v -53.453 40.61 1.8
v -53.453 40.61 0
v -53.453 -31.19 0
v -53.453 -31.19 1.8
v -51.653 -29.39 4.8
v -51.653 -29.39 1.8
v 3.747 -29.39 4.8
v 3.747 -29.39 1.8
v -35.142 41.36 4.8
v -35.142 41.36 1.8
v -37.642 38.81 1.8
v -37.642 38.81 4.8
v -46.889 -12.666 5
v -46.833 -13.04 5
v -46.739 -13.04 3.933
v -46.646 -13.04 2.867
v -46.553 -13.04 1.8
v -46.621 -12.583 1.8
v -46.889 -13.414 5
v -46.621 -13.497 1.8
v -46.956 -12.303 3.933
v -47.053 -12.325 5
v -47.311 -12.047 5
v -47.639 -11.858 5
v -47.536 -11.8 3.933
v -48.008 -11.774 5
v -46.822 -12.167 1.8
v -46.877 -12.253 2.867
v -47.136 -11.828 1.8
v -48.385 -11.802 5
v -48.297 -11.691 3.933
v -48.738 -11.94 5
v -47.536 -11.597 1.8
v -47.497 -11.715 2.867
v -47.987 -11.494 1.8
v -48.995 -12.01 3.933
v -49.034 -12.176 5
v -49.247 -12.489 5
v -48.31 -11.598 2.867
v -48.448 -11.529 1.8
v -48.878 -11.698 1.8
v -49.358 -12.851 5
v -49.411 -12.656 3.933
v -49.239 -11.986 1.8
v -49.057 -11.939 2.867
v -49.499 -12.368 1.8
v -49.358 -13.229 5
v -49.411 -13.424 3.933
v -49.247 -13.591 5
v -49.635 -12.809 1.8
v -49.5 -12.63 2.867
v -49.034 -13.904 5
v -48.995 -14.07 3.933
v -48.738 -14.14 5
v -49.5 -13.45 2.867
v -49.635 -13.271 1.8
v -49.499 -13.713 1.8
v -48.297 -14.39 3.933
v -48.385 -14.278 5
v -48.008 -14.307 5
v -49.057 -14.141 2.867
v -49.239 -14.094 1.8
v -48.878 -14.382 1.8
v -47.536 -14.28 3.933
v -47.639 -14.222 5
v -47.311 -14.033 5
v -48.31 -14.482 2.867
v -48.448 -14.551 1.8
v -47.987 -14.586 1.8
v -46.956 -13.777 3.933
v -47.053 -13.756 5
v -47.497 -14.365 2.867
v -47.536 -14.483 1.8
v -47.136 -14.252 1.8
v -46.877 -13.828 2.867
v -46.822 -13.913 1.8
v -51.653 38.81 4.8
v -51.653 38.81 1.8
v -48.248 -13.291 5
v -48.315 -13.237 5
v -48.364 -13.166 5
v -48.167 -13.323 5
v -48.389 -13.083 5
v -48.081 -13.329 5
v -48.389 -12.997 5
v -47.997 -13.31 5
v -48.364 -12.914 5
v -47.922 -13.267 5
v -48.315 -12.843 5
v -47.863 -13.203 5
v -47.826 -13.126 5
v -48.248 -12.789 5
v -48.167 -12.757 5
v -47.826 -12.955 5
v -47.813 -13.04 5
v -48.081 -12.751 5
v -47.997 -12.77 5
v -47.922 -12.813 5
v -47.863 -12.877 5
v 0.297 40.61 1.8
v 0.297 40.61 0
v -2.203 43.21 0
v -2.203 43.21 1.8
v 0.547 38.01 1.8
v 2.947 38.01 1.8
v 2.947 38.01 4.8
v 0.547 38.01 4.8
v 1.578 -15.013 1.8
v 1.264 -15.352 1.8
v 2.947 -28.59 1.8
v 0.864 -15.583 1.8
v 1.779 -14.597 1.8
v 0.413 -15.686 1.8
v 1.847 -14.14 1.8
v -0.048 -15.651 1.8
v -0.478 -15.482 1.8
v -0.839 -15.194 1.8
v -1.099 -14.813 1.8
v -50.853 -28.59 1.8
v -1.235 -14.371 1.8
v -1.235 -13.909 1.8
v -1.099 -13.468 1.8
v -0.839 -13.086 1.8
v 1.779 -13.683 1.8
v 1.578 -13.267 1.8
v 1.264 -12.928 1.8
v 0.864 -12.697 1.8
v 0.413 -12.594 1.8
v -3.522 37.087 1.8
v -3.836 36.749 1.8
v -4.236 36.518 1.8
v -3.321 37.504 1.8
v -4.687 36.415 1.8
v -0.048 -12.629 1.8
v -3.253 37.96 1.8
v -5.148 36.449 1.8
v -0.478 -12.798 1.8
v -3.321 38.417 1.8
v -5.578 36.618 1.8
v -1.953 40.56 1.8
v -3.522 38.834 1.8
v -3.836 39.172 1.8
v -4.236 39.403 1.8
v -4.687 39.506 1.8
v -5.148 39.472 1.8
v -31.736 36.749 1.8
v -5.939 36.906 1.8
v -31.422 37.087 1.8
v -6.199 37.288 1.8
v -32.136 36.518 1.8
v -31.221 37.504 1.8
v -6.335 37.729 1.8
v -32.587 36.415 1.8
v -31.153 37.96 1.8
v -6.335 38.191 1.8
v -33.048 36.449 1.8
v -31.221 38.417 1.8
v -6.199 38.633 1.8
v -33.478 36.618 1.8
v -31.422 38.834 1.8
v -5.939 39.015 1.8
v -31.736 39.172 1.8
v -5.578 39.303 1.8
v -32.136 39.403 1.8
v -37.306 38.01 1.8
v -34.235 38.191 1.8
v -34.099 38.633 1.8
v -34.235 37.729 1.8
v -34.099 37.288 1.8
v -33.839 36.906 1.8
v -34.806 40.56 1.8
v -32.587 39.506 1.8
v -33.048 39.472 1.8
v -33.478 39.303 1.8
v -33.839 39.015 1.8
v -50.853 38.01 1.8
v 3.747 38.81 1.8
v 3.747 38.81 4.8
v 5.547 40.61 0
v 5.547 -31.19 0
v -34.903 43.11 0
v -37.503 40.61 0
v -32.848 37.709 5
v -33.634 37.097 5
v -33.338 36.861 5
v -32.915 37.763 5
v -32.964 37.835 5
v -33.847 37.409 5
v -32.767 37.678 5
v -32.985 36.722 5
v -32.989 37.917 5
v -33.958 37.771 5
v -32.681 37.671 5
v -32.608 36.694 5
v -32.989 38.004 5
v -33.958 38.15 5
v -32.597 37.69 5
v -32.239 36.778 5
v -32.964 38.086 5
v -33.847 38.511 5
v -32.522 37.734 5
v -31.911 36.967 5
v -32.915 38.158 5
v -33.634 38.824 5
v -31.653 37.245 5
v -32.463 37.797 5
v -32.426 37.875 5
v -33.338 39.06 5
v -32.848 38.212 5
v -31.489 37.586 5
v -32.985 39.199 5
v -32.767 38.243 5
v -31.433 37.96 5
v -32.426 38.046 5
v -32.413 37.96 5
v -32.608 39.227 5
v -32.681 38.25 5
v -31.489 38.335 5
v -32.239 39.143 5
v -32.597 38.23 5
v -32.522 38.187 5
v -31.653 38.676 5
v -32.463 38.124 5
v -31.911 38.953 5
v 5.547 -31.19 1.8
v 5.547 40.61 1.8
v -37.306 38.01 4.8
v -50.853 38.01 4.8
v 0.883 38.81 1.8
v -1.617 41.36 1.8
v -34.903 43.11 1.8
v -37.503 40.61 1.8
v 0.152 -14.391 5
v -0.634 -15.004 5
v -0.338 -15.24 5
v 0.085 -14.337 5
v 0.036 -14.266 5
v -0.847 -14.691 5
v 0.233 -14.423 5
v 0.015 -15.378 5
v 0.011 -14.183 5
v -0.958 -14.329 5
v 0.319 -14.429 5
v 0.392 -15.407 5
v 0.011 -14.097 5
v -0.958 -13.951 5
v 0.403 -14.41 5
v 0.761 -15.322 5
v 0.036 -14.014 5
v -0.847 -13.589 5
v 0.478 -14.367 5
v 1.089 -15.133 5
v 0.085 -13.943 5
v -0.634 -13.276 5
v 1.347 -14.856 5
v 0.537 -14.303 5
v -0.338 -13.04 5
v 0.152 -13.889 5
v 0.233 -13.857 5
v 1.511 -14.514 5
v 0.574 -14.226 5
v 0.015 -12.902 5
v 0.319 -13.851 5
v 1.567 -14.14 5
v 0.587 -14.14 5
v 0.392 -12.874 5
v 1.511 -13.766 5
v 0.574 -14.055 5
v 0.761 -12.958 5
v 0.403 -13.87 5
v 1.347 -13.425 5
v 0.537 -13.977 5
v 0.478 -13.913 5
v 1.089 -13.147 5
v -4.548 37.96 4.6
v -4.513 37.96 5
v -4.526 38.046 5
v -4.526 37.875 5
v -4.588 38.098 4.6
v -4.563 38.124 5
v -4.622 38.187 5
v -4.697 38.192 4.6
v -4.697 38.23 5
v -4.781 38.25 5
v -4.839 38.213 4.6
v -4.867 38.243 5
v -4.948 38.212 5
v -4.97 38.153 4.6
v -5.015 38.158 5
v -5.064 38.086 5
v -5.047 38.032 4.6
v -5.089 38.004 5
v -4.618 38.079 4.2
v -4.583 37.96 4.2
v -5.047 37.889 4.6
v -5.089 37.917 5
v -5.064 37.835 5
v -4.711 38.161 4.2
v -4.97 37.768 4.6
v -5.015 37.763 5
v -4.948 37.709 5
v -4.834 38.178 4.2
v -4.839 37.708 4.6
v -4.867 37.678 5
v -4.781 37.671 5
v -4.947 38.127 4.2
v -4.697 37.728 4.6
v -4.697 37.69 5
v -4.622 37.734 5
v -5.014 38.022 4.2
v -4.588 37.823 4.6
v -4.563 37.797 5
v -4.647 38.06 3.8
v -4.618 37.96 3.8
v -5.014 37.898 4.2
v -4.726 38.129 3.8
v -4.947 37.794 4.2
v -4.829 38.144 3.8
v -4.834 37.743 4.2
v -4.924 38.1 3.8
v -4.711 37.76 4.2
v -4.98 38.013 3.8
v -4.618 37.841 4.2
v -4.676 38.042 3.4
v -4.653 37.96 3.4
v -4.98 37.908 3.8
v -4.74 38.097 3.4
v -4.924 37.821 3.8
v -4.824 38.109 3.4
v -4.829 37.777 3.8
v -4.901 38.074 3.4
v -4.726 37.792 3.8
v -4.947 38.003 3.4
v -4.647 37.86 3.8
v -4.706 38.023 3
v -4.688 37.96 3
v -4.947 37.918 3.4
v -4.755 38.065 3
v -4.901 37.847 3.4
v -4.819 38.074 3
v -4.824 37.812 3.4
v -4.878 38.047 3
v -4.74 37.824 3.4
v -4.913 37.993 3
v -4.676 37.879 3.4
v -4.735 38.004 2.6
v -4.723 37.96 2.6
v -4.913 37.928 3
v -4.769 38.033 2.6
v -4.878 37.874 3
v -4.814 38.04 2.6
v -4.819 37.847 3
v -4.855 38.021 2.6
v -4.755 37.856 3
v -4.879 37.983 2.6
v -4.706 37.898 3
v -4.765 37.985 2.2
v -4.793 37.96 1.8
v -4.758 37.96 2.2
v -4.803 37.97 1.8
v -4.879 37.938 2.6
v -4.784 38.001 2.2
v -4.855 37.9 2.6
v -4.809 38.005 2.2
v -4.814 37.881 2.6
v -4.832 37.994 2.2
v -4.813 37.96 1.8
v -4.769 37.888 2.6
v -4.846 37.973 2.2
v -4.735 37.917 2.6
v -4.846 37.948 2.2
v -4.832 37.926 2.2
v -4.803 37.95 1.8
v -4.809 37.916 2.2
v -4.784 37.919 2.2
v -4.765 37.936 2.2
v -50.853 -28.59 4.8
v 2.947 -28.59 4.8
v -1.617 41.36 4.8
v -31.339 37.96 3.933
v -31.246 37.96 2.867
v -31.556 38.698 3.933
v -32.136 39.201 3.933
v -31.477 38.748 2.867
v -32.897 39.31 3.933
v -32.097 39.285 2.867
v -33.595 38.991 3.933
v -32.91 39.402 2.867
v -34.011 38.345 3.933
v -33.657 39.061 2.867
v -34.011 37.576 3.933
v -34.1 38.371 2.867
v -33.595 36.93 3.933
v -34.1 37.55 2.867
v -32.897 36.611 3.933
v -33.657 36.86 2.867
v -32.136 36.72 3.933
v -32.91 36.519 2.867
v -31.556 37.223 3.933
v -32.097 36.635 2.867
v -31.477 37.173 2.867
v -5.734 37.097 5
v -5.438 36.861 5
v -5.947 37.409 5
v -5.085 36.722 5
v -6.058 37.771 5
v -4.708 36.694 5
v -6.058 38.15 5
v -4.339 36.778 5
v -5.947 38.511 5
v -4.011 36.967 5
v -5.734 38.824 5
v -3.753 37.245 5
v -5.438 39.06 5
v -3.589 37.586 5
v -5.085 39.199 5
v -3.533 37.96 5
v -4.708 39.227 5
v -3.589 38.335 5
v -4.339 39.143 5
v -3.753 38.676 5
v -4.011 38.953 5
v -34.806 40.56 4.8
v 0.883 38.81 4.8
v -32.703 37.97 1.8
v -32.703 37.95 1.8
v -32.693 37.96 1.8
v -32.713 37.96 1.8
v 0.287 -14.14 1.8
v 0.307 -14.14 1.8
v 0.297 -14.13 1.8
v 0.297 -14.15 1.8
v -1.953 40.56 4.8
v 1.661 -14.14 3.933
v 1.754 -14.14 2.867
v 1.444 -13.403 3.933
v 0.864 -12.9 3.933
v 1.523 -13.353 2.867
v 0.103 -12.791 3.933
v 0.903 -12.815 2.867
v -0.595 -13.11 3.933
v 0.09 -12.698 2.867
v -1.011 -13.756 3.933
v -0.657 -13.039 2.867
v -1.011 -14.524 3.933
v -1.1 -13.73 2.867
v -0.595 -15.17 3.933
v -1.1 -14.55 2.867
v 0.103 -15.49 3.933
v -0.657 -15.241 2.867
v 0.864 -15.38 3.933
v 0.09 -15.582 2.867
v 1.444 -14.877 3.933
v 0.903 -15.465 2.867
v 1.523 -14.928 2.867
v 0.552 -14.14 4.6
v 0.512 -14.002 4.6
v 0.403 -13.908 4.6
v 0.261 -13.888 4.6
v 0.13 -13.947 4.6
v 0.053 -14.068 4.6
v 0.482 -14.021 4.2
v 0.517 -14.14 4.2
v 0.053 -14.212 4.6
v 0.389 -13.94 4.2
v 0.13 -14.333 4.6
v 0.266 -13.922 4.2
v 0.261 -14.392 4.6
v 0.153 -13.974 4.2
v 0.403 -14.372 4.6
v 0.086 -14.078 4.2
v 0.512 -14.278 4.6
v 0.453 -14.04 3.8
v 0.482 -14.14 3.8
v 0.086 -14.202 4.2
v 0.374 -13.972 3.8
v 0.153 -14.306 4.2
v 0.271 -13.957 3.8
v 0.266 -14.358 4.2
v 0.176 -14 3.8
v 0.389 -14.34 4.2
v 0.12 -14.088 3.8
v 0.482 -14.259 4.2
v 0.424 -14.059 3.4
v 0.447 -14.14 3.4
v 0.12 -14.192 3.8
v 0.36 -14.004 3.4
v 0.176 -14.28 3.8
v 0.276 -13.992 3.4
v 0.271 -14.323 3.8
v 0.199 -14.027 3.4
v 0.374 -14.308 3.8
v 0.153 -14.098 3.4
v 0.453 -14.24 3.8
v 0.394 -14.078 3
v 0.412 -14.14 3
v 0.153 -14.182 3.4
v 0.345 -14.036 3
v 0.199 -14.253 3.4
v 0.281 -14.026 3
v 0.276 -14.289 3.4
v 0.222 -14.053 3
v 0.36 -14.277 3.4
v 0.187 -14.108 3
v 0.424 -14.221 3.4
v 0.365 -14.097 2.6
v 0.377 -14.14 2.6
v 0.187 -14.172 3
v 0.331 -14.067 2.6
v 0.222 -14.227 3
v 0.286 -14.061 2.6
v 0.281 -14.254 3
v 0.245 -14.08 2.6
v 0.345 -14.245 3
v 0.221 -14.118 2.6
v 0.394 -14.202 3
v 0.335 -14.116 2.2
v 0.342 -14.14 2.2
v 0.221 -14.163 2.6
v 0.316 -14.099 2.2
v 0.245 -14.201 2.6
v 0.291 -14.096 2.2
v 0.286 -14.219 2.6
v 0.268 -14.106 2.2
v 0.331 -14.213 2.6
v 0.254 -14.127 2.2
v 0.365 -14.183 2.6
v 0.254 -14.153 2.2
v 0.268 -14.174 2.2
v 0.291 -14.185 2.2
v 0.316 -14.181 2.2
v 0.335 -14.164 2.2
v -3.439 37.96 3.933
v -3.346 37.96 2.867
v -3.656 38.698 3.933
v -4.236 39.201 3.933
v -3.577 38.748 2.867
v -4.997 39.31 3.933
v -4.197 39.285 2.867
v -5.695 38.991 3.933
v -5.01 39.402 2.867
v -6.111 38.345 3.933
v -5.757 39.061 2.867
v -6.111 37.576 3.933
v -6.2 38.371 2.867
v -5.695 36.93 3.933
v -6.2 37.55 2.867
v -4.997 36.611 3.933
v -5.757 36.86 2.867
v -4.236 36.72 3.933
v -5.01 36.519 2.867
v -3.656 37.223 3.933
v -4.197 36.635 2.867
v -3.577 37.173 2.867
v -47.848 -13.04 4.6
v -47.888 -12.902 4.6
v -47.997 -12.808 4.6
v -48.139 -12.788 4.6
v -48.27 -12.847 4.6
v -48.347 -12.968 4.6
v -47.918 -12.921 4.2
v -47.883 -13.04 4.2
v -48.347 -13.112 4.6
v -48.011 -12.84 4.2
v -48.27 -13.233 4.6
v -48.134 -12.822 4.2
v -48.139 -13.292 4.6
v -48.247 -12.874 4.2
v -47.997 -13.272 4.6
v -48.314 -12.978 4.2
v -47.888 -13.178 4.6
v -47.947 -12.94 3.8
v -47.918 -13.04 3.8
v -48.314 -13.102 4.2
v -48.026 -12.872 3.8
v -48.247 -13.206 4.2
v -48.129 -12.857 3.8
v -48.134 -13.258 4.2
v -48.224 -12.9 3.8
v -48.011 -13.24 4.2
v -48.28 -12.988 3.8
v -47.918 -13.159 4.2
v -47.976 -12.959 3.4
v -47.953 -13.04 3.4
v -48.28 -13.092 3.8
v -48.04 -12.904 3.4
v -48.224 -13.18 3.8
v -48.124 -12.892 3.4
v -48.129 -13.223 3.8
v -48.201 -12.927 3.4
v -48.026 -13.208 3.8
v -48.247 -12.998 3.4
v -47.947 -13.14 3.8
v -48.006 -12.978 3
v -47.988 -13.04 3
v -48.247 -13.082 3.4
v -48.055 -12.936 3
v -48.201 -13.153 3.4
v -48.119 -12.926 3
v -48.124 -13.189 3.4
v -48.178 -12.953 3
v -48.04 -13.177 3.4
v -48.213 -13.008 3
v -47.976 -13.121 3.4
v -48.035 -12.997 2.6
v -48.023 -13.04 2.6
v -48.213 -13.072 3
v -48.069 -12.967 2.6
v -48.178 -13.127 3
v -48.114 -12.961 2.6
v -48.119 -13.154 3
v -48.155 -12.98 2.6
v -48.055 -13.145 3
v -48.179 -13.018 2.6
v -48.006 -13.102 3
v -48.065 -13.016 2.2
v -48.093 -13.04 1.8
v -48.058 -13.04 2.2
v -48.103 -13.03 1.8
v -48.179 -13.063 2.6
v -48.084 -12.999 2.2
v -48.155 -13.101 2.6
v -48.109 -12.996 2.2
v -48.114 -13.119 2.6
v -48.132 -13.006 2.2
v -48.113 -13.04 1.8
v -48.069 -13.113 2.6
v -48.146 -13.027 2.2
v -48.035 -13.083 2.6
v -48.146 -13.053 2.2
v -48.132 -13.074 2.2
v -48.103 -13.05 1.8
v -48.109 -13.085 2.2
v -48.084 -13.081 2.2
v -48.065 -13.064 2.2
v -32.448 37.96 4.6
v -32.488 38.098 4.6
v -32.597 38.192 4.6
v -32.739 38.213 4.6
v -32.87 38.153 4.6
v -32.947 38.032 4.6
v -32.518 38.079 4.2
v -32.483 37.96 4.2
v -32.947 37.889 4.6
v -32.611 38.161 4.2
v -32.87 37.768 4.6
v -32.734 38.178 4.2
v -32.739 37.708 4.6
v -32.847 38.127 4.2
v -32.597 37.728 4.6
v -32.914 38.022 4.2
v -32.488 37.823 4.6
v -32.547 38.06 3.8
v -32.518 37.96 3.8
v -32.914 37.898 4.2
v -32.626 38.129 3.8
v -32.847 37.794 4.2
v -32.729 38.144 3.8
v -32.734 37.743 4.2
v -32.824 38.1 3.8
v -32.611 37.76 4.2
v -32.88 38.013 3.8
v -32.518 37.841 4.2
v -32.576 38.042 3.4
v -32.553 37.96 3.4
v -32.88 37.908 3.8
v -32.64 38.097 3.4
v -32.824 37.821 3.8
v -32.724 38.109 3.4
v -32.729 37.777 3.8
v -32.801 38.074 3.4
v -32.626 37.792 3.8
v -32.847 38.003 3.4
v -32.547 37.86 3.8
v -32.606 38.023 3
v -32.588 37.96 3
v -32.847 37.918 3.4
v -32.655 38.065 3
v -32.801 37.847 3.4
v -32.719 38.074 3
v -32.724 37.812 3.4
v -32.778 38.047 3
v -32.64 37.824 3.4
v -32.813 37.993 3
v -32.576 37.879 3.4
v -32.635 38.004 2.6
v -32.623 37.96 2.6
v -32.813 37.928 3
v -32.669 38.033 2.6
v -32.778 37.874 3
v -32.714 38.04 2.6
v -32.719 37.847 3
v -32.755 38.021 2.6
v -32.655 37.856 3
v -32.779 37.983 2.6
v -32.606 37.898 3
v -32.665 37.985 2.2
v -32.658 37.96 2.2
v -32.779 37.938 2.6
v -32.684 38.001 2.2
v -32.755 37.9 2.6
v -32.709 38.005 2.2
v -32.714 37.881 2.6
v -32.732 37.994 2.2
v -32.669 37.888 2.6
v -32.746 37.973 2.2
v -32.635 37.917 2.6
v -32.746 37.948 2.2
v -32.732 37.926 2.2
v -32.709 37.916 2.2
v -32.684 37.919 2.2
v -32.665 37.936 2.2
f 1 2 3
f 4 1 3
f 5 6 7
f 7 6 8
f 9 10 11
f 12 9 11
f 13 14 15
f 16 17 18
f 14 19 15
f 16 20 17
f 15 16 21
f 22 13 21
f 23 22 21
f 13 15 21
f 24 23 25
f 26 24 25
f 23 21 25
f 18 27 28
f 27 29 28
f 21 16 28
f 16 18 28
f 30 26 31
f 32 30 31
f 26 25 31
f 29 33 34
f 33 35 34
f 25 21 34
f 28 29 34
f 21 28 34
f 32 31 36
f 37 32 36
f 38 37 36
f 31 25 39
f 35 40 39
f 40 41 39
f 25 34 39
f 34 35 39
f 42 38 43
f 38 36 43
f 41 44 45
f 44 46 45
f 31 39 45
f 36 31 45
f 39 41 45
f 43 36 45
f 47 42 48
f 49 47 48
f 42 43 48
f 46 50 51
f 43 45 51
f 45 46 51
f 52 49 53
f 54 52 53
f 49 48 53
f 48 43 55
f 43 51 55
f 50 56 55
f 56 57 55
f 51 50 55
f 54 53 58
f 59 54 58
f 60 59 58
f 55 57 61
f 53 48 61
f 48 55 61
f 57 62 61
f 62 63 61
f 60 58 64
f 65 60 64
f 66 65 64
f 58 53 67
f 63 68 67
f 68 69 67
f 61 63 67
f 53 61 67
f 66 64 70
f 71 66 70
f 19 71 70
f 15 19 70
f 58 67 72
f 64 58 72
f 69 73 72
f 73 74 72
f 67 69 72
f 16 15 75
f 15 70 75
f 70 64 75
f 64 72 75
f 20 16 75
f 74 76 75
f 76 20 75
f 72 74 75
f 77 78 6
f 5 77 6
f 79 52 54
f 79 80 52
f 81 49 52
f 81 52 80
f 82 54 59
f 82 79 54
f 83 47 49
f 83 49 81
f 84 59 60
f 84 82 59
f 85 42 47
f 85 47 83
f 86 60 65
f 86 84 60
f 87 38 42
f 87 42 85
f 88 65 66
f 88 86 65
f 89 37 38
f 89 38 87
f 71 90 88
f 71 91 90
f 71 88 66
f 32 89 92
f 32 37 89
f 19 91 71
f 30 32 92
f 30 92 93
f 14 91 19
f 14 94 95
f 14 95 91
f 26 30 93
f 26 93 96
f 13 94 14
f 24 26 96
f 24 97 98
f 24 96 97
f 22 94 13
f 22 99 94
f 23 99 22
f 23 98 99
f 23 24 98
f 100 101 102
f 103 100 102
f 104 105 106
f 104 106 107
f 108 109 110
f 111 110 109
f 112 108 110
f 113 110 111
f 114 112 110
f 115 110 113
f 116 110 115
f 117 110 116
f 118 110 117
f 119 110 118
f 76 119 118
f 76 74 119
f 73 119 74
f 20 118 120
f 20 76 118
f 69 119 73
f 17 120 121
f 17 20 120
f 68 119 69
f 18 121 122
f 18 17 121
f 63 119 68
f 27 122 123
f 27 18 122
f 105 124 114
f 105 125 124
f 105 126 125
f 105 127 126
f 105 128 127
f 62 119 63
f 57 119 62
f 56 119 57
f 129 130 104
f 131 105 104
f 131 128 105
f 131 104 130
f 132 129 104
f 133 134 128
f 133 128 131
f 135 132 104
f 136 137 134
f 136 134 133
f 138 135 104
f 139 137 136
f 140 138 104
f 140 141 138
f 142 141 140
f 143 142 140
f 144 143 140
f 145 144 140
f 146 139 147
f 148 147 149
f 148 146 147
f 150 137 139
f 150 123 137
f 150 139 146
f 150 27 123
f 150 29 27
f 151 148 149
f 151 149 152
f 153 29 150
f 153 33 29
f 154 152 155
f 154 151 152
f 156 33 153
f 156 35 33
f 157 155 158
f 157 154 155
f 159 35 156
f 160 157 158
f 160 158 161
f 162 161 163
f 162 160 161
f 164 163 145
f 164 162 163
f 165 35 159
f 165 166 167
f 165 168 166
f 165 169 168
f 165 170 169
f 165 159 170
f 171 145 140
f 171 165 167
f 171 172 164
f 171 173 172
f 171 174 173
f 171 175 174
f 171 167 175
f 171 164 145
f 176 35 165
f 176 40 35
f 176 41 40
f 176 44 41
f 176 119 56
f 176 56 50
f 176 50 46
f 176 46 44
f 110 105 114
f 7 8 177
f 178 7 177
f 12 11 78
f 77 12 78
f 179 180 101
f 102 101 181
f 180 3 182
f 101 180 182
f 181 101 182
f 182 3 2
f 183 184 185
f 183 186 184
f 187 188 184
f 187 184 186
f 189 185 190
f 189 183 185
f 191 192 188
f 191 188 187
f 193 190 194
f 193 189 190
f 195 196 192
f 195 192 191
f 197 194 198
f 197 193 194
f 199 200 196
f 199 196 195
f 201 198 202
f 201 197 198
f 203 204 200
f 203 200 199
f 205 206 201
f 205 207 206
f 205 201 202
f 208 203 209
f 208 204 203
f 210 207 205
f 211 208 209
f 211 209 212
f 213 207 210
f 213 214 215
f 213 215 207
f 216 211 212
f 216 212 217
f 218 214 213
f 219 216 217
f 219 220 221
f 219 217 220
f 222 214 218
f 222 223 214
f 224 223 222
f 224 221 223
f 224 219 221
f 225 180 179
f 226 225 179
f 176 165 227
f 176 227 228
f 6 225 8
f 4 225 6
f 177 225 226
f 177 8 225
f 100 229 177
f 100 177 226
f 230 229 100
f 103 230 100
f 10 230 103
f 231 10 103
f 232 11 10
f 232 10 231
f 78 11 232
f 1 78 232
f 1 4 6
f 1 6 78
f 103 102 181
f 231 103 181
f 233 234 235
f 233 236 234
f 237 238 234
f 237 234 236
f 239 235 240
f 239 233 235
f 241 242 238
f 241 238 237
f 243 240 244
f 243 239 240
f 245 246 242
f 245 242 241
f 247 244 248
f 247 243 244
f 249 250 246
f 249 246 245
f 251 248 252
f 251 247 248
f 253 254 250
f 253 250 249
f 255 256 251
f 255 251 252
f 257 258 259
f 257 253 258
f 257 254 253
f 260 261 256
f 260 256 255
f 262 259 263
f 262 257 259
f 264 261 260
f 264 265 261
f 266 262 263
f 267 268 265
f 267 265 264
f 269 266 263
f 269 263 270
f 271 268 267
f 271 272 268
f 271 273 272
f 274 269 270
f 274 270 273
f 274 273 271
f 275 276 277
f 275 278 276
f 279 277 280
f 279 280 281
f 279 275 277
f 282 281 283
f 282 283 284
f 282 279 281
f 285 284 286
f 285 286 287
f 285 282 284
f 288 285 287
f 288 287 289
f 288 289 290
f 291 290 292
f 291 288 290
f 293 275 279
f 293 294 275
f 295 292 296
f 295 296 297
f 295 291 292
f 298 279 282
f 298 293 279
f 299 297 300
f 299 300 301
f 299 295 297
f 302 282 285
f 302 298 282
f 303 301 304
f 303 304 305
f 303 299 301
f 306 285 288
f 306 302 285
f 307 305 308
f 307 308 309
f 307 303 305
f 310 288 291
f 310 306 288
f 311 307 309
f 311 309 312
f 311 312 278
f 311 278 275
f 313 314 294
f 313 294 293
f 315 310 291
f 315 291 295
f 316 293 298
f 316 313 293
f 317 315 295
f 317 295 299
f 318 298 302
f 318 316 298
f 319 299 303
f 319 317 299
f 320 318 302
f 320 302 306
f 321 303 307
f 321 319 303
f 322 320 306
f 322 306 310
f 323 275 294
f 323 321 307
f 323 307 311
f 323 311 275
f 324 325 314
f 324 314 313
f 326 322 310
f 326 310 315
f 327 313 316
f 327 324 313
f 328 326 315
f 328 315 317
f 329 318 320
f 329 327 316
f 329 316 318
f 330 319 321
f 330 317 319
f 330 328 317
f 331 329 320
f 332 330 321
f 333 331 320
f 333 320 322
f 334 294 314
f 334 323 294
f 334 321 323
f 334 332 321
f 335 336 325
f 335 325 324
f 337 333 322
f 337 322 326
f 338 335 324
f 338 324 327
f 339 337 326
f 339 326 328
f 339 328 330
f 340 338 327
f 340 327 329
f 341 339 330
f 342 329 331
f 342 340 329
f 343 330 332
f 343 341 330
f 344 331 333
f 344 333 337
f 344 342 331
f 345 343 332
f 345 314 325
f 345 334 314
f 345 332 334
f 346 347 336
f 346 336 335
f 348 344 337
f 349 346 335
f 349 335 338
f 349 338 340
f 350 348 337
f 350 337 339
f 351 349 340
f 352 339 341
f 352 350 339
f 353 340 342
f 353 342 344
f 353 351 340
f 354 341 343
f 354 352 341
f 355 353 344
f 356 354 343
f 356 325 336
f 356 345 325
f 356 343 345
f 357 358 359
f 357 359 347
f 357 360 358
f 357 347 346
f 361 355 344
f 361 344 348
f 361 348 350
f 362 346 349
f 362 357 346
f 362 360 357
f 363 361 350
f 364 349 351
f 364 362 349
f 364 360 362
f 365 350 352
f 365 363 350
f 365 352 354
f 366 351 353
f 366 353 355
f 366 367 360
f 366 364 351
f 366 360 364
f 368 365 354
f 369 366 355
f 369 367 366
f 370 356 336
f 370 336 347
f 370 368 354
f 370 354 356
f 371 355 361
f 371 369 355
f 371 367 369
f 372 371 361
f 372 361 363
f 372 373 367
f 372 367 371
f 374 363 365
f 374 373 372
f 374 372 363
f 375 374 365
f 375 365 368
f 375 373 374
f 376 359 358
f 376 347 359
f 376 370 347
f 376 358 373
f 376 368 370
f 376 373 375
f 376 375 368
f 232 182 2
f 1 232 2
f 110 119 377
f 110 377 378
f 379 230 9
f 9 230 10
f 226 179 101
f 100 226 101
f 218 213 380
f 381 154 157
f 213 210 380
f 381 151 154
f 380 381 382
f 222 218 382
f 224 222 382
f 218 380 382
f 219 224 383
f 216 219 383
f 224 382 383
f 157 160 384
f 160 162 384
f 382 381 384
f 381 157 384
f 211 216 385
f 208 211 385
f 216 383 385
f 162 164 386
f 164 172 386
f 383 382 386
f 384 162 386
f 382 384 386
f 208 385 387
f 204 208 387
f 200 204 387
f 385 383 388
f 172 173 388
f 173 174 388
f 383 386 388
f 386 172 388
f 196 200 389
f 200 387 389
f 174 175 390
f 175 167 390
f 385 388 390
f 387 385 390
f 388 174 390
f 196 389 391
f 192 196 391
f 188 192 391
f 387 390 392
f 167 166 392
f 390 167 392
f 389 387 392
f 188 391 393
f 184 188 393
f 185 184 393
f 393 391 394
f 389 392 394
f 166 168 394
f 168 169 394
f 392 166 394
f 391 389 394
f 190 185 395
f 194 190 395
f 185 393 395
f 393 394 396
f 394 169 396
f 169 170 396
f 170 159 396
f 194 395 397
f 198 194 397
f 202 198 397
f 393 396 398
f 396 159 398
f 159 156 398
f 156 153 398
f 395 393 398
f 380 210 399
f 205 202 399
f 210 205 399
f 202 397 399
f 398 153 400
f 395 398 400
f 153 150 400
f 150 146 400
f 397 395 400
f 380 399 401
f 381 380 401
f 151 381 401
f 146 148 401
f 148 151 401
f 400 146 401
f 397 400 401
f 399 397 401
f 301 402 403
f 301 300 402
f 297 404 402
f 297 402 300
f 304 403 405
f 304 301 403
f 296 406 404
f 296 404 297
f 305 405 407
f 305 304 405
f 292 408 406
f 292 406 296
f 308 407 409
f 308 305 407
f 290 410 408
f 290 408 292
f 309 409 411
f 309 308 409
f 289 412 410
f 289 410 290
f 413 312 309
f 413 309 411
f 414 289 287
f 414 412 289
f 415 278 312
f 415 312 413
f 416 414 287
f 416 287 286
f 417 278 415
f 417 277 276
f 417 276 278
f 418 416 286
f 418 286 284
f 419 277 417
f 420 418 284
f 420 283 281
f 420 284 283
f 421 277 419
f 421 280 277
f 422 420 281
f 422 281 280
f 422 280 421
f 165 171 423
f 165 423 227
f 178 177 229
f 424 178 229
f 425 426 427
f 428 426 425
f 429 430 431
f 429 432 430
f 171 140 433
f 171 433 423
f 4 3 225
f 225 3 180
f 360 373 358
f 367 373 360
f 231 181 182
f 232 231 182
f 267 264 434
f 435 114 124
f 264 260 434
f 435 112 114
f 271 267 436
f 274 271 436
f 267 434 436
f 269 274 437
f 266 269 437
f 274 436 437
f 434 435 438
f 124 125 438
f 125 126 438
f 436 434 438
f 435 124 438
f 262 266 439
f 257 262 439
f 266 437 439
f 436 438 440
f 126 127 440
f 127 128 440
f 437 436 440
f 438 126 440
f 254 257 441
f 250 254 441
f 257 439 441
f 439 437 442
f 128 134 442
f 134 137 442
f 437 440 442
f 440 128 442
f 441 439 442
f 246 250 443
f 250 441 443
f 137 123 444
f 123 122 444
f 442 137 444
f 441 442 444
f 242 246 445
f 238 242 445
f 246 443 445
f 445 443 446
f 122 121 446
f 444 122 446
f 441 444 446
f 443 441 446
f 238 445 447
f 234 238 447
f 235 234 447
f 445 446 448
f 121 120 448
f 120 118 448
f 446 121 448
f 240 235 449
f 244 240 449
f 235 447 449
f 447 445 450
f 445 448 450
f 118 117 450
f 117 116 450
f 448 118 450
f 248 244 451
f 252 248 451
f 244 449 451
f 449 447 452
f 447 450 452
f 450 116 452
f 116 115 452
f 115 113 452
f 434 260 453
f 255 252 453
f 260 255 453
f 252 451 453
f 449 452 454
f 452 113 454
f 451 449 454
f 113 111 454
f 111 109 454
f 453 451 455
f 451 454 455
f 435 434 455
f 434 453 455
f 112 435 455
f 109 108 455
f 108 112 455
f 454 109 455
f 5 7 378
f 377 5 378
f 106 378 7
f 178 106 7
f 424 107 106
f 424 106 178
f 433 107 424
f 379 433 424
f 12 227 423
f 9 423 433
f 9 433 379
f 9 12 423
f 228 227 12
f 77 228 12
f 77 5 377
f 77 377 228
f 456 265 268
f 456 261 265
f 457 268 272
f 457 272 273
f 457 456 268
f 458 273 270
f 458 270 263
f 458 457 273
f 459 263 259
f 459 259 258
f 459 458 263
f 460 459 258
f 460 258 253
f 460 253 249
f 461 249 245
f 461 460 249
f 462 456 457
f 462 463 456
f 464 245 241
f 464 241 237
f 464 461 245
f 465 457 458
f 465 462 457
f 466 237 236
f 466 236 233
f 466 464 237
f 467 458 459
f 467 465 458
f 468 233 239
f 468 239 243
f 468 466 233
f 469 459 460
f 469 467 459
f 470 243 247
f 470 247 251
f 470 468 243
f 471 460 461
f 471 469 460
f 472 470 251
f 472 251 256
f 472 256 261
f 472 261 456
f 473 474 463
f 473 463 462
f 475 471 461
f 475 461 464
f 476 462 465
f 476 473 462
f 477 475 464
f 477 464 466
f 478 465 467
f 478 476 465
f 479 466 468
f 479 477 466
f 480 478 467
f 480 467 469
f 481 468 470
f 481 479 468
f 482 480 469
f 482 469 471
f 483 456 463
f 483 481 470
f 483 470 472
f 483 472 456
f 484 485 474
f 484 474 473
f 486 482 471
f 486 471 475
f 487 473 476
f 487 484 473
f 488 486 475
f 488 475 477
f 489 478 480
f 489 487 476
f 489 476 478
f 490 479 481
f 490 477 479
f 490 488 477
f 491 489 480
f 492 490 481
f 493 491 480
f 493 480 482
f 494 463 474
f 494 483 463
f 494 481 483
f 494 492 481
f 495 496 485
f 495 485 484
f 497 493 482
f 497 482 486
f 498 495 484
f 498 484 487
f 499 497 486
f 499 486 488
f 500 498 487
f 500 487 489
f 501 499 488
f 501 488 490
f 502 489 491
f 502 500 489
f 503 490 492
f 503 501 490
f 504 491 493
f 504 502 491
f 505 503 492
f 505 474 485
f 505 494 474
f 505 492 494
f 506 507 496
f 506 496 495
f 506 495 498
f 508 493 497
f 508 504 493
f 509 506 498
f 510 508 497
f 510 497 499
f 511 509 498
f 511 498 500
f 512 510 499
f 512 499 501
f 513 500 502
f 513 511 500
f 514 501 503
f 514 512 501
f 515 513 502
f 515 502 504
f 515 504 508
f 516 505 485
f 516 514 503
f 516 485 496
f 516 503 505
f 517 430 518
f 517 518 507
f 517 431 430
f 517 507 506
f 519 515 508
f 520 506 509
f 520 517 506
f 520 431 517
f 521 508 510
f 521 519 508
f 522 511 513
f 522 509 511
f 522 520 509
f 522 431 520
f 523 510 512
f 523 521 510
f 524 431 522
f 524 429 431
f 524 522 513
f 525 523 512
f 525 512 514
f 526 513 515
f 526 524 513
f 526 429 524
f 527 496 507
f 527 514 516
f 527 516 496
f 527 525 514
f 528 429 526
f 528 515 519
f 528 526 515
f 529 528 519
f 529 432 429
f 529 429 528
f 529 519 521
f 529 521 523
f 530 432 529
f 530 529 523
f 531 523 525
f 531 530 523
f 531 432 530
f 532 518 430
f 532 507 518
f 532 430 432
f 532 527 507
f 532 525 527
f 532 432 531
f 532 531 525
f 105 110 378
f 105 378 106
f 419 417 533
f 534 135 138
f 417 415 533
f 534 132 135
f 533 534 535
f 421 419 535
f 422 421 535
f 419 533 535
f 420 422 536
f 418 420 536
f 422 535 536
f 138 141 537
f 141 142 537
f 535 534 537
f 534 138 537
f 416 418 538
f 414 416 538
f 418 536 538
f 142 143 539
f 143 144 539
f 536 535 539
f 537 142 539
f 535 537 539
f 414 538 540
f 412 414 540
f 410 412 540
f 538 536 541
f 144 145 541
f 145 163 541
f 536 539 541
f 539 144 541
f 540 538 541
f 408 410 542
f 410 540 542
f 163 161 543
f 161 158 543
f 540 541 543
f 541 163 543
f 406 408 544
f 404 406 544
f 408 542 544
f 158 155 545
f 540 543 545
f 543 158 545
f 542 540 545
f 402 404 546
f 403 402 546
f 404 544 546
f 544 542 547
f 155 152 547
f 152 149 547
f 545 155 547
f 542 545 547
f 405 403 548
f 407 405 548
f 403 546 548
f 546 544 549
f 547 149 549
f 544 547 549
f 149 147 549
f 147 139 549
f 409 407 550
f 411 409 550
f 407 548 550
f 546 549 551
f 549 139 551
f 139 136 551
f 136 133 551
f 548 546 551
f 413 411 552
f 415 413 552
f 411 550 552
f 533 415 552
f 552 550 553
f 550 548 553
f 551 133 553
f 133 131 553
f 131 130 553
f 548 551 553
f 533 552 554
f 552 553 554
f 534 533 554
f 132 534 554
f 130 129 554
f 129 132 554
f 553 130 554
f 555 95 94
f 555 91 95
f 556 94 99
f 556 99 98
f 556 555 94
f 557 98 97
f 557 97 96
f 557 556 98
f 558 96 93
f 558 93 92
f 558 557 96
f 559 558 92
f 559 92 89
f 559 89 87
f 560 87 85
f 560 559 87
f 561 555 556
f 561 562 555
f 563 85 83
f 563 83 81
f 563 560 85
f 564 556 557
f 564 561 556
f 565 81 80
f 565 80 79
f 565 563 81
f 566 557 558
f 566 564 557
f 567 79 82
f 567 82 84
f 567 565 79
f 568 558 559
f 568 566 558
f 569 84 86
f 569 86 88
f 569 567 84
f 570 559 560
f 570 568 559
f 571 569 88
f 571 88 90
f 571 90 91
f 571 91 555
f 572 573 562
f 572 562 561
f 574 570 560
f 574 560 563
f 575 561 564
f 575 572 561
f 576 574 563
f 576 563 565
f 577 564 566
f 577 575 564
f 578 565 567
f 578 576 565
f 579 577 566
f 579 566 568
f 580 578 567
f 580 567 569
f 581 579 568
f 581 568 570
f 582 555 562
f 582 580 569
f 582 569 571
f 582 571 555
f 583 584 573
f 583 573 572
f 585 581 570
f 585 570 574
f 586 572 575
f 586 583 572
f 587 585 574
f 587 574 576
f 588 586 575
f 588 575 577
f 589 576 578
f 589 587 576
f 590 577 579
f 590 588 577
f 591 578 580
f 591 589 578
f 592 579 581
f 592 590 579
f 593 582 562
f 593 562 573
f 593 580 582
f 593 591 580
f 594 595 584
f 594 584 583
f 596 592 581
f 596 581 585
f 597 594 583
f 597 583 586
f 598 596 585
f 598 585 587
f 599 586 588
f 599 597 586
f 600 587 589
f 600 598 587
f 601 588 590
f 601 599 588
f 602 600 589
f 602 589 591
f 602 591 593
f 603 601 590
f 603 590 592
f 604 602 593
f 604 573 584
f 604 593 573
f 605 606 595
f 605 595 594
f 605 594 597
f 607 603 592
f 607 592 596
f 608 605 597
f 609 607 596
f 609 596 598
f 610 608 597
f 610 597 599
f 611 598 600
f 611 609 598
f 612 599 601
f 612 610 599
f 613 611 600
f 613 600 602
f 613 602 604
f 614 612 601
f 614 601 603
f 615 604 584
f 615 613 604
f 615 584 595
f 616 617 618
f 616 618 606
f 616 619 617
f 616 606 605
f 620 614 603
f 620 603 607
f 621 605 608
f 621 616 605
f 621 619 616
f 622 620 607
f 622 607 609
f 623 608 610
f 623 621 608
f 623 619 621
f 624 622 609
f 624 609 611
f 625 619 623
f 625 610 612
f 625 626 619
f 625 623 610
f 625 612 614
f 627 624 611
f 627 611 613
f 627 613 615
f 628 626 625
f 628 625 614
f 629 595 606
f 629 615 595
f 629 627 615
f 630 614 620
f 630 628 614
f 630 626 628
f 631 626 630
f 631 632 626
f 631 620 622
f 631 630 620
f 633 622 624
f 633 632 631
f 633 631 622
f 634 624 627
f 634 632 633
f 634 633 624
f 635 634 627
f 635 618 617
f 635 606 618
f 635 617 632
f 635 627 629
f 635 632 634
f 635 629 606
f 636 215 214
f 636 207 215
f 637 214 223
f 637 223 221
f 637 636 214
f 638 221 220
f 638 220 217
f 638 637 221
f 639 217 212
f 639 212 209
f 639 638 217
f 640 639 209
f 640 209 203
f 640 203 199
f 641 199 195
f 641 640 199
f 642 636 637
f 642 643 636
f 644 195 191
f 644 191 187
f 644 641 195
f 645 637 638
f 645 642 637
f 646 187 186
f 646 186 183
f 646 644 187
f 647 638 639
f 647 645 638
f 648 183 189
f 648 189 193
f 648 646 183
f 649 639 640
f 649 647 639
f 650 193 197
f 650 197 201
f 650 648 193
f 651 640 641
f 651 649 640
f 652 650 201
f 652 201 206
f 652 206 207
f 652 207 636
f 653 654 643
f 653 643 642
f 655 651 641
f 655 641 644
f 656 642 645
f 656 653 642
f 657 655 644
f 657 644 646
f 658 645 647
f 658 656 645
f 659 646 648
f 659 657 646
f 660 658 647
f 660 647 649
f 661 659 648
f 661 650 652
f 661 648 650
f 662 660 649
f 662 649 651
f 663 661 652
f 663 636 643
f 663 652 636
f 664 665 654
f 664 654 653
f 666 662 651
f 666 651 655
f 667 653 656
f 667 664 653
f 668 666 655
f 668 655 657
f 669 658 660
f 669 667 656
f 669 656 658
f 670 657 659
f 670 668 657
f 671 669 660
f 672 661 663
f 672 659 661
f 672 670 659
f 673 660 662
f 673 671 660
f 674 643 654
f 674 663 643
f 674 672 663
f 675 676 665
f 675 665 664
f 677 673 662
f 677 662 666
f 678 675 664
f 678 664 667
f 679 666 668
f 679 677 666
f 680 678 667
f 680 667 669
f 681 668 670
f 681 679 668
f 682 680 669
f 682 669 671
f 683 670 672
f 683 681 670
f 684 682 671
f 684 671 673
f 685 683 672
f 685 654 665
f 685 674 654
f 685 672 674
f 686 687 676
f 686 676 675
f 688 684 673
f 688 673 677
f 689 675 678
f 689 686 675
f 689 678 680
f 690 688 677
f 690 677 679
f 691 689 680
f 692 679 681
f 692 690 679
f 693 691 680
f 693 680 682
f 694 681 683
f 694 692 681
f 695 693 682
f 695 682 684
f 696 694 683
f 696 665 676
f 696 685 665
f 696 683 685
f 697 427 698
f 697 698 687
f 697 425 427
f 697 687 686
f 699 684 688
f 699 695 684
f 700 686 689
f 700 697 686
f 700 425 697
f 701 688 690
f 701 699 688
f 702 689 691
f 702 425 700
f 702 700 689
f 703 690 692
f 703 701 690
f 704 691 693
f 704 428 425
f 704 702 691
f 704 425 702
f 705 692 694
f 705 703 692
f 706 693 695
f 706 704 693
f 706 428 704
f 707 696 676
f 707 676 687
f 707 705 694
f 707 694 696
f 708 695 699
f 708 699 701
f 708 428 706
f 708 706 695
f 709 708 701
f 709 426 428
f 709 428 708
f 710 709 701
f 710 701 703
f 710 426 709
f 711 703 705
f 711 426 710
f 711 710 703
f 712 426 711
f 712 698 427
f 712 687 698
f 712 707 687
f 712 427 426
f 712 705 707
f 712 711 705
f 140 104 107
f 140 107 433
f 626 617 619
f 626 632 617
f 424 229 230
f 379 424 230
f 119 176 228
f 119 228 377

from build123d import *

# Parameters (mm, degrees)
BOSS_EXTRUDE1_DEPTH           = 1.8
EXTRUDE_THIN1_START           = 1.8
EXTRUDE_THIN1_DEPTH           = 3
SKETCH7_R                     = 1.55
SKETCH7_R_2                   = 0.01
EXTRUDE_THIN2_DEPTH           = 3.2
EXTRUDE_THIN2_DRAFT           = 5
EXTRUDE_THIN2_PROFILE_2_DEPTH = 3.2
EXTRUDE_THIN2_PROFILE_2_DRAFT = 5
EXTRUDE_THIN2_PROFILE_3_DEPTH = 3.2
EXTRUDE_THIN2_PROFILE_3_DRAFT = 5
EXTRUDE_THIN2_PROFILE_4_DEPTH = 3.2
EXTRUDE_THIN2_PROFILE_4_DRAFT = 5


with BuildPart() as part:
    # Sketch1 → Boss-Extrude1 (new body)
    with BuildSketch(Plane(origin=(0, 0, 0), x_dir=(0, 1, 0), z_dir=(0, 0, 1))):
        Polygon((40.609900374, 53.452613812), (-31.190099626, 53.452613812), (-31.190099626, -5.547386188), (40.609900374, -5.547386188), (40.609900374, -0.297386188), (43.209900374, 2.202613812), (43.109900374, 34.902613812), (40.609900374, 37.502613812), align=None)
    extrude(amount=BOSS_EXTRUDE1_DEPTH)

    # Sketch5 → Extrude-Thin1 (add)
    with BuildSketch(Plane(origin=(0, 0, 0), x_dir=(0, 1, 0), z_dir=(0, 0, 1)).offset(EXTRUDE_THIN1_START)):
        Polygon((-29.390099626, 51.652613812), (-29.390099626, -3.747386188), (38.809900374, -3.747386188), (38.809900374, -0.88342499), (41.360418353, 1.616884702), (41.360418353, 35.141633158), (38.809900374, 37.64194285), (38.809900374, 51.652613812), align=None)
        Polygon((-28.590099626, 50.852613812), (-28.590099626, -2.947386188), (38.009900374, -2.947386188), (38.009900374, -0.547386188), (40.560418353, 1.952923505), (40.560418353, 34.805594355), (38.009900374, 37.305904047), (38.009900374, 50.852613812), align=None, mode=Mode.SUBTRACT)
    extrude(amount=EXTRUDE_THIN1_DEPTH)


with BuildPart() as extrude_thin2_tool:
    # Sketch7 → Extrude-Thin2 (with draft: the straight prism first)
    with BuildSketch(Plane.XY.offset(1.8)):
        with Locations((-4.802613812, 37.960418353)):
            Circle(SKETCH7_R)
        with Locations((-4.802613812, 37.960418353)):
            Circle(SKETCH7_R_2, mode=Mode.SUBTRACT)
    extrude(amount=EXTRUDE_THIN2_DEPTH)
    # Extrude-Thin2: the draft: its side faces are tilted about the plane it starts from
    extrude_thin2_sides = [extrude_thin2_tool.faces().sort_by_distance(p)[0] for p in [
        (-6.352613812, 37.960418353, 3.4),
        (-4.812613812, 37.960418353, 3.4),
    ]]
    draft(extrude_thin2_sides, Plane.XY.offset(1.8), EXTRUDE_THIN2_DRAFT)


with BuildPart() as part_1:
    add(part.part)

    # Extrude-Thin2: add extrude_thin2_tool
    add(extrude_thin2_tool.part)


with BuildPart() as extrude_thin2_profile_2_tool:
    # Sketch7 → Extrude-Thin2 profile 2 (with draft: the straight prism first)
    with BuildSketch(Plane.XY.offset(1.8)):
        with Locations((-32.702613812, 37.960418353)):
            Circle(SKETCH7_R)
        with Locations((-32.702613812, 37.960418353)):
            Circle(SKETCH7_R_2, mode=Mode.SUBTRACT)
    extrude(amount=EXTRUDE_THIN2_PROFILE_2_DEPTH)
    # Extrude-Thin2 profile 2: the draft: its side faces are tilted about the plane it starts from
    extrude_thin2_profile_2_sides = [extrude_thin2_profile_2_tool.faces().sort_by_distance(p)[0] for p in [
        (-34.252613812, 37.960418353, 3.4),
        (-32.712613812, 37.960418353, 3.4),
    ]]
    draft(extrude_thin2_profile_2_sides, Plane.XY.offset(1.8), EXTRUDE_THIN2_PROFILE_2_DRAFT)


with BuildPart() as part_2:
    add(part_1.part)

    # Extrude-Thin2 profile 2: add extrude_thin2_profile_2_tool
    add(extrude_thin2_profile_2_tool.part)


with BuildPart() as extrude_thin2_profile_3_tool:
    # Sketch7 → Extrude-Thin2 profile 3 (with draft: the straight prism first)
    with BuildSketch(Plane.XY.offset(1.8)):
        with Locations((0.297386188, -14.140099626)):
            Circle(SKETCH7_R)
        with Locations((0.297386188, -14.140099626)):
            Circle(SKETCH7_R_2, mode=Mode.SUBTRACT)
    extrude(amount=EXTRUDE_THIN2_PROFILE_3_DEPTH)
    # Extrude-Thin2 profile 3: the draft: its side faces are tilted about the plane it starts from
    extrude_thin2_profile_3_sides = [extrude_thin2_profile_3_tool.faces().sort_by_distance(p)[0] for p in [
        (-1.252613812, -14.140099626, 3.4),
        (0.287386188, -14.140099626, 3.4),
    ]]
    draft(extrude_thin2_profile_3_sides, Plane.XY.offset(1.8), EXTRUDE_THIN2_PROFILE_3_DRAFT)


with BuildPart() as part_3:
    add(part_2.part)

    # Extrude-Thin2 profile 3: add extrude_thin2_profile_3_tool
    add(extrude_thin2_profile_3_tool.part)


with BuildPart() as extrude_thin2_profile_4_tool:
    # Sketch7 → Extrude-Thin2 profile 4 (with draft: the straight prism first)
    with BuildSketch(Plane.XY.offset(1.8)):
        with Locations((-48.102613812, -13.040099626)):
            Circle(SKETCH7_R)
        with Locations((-48.102613812, -13.040099626)):
            Circle(SKETCH7_R_2, mode=Mode.SUBTRACT)
    extrude(amount=EXTRUDE_THIN2_PROFILE_4_DEPTH)
    # Extrude-Thin2 profile 4: the draft: its side faces are tilted about the plane it starts from
    extrude_thin2_profile_4_sides = [extrude_thin2_profile_4_tool.faces().sort_by_distance(p)[0] for p in [
        (-49.652613812, -13.040099626, 3.4),
        (-48.112613812, -13.040099626, 3.4),
    ]]
    draft(extrude_thin2_profile_4_sides, Plane.XY.offset(1.8), EXTRUDE_THIN2_PROFILE_4_DRAFT)


with BuildPart() as part_4:
    add(part_3.part)

    # Extrude-Thin2 profile 4: add extrude_thin2_profile_4_tool
    add(extrude_thin2_profile_4_tool.part)


solid = part_4.part
